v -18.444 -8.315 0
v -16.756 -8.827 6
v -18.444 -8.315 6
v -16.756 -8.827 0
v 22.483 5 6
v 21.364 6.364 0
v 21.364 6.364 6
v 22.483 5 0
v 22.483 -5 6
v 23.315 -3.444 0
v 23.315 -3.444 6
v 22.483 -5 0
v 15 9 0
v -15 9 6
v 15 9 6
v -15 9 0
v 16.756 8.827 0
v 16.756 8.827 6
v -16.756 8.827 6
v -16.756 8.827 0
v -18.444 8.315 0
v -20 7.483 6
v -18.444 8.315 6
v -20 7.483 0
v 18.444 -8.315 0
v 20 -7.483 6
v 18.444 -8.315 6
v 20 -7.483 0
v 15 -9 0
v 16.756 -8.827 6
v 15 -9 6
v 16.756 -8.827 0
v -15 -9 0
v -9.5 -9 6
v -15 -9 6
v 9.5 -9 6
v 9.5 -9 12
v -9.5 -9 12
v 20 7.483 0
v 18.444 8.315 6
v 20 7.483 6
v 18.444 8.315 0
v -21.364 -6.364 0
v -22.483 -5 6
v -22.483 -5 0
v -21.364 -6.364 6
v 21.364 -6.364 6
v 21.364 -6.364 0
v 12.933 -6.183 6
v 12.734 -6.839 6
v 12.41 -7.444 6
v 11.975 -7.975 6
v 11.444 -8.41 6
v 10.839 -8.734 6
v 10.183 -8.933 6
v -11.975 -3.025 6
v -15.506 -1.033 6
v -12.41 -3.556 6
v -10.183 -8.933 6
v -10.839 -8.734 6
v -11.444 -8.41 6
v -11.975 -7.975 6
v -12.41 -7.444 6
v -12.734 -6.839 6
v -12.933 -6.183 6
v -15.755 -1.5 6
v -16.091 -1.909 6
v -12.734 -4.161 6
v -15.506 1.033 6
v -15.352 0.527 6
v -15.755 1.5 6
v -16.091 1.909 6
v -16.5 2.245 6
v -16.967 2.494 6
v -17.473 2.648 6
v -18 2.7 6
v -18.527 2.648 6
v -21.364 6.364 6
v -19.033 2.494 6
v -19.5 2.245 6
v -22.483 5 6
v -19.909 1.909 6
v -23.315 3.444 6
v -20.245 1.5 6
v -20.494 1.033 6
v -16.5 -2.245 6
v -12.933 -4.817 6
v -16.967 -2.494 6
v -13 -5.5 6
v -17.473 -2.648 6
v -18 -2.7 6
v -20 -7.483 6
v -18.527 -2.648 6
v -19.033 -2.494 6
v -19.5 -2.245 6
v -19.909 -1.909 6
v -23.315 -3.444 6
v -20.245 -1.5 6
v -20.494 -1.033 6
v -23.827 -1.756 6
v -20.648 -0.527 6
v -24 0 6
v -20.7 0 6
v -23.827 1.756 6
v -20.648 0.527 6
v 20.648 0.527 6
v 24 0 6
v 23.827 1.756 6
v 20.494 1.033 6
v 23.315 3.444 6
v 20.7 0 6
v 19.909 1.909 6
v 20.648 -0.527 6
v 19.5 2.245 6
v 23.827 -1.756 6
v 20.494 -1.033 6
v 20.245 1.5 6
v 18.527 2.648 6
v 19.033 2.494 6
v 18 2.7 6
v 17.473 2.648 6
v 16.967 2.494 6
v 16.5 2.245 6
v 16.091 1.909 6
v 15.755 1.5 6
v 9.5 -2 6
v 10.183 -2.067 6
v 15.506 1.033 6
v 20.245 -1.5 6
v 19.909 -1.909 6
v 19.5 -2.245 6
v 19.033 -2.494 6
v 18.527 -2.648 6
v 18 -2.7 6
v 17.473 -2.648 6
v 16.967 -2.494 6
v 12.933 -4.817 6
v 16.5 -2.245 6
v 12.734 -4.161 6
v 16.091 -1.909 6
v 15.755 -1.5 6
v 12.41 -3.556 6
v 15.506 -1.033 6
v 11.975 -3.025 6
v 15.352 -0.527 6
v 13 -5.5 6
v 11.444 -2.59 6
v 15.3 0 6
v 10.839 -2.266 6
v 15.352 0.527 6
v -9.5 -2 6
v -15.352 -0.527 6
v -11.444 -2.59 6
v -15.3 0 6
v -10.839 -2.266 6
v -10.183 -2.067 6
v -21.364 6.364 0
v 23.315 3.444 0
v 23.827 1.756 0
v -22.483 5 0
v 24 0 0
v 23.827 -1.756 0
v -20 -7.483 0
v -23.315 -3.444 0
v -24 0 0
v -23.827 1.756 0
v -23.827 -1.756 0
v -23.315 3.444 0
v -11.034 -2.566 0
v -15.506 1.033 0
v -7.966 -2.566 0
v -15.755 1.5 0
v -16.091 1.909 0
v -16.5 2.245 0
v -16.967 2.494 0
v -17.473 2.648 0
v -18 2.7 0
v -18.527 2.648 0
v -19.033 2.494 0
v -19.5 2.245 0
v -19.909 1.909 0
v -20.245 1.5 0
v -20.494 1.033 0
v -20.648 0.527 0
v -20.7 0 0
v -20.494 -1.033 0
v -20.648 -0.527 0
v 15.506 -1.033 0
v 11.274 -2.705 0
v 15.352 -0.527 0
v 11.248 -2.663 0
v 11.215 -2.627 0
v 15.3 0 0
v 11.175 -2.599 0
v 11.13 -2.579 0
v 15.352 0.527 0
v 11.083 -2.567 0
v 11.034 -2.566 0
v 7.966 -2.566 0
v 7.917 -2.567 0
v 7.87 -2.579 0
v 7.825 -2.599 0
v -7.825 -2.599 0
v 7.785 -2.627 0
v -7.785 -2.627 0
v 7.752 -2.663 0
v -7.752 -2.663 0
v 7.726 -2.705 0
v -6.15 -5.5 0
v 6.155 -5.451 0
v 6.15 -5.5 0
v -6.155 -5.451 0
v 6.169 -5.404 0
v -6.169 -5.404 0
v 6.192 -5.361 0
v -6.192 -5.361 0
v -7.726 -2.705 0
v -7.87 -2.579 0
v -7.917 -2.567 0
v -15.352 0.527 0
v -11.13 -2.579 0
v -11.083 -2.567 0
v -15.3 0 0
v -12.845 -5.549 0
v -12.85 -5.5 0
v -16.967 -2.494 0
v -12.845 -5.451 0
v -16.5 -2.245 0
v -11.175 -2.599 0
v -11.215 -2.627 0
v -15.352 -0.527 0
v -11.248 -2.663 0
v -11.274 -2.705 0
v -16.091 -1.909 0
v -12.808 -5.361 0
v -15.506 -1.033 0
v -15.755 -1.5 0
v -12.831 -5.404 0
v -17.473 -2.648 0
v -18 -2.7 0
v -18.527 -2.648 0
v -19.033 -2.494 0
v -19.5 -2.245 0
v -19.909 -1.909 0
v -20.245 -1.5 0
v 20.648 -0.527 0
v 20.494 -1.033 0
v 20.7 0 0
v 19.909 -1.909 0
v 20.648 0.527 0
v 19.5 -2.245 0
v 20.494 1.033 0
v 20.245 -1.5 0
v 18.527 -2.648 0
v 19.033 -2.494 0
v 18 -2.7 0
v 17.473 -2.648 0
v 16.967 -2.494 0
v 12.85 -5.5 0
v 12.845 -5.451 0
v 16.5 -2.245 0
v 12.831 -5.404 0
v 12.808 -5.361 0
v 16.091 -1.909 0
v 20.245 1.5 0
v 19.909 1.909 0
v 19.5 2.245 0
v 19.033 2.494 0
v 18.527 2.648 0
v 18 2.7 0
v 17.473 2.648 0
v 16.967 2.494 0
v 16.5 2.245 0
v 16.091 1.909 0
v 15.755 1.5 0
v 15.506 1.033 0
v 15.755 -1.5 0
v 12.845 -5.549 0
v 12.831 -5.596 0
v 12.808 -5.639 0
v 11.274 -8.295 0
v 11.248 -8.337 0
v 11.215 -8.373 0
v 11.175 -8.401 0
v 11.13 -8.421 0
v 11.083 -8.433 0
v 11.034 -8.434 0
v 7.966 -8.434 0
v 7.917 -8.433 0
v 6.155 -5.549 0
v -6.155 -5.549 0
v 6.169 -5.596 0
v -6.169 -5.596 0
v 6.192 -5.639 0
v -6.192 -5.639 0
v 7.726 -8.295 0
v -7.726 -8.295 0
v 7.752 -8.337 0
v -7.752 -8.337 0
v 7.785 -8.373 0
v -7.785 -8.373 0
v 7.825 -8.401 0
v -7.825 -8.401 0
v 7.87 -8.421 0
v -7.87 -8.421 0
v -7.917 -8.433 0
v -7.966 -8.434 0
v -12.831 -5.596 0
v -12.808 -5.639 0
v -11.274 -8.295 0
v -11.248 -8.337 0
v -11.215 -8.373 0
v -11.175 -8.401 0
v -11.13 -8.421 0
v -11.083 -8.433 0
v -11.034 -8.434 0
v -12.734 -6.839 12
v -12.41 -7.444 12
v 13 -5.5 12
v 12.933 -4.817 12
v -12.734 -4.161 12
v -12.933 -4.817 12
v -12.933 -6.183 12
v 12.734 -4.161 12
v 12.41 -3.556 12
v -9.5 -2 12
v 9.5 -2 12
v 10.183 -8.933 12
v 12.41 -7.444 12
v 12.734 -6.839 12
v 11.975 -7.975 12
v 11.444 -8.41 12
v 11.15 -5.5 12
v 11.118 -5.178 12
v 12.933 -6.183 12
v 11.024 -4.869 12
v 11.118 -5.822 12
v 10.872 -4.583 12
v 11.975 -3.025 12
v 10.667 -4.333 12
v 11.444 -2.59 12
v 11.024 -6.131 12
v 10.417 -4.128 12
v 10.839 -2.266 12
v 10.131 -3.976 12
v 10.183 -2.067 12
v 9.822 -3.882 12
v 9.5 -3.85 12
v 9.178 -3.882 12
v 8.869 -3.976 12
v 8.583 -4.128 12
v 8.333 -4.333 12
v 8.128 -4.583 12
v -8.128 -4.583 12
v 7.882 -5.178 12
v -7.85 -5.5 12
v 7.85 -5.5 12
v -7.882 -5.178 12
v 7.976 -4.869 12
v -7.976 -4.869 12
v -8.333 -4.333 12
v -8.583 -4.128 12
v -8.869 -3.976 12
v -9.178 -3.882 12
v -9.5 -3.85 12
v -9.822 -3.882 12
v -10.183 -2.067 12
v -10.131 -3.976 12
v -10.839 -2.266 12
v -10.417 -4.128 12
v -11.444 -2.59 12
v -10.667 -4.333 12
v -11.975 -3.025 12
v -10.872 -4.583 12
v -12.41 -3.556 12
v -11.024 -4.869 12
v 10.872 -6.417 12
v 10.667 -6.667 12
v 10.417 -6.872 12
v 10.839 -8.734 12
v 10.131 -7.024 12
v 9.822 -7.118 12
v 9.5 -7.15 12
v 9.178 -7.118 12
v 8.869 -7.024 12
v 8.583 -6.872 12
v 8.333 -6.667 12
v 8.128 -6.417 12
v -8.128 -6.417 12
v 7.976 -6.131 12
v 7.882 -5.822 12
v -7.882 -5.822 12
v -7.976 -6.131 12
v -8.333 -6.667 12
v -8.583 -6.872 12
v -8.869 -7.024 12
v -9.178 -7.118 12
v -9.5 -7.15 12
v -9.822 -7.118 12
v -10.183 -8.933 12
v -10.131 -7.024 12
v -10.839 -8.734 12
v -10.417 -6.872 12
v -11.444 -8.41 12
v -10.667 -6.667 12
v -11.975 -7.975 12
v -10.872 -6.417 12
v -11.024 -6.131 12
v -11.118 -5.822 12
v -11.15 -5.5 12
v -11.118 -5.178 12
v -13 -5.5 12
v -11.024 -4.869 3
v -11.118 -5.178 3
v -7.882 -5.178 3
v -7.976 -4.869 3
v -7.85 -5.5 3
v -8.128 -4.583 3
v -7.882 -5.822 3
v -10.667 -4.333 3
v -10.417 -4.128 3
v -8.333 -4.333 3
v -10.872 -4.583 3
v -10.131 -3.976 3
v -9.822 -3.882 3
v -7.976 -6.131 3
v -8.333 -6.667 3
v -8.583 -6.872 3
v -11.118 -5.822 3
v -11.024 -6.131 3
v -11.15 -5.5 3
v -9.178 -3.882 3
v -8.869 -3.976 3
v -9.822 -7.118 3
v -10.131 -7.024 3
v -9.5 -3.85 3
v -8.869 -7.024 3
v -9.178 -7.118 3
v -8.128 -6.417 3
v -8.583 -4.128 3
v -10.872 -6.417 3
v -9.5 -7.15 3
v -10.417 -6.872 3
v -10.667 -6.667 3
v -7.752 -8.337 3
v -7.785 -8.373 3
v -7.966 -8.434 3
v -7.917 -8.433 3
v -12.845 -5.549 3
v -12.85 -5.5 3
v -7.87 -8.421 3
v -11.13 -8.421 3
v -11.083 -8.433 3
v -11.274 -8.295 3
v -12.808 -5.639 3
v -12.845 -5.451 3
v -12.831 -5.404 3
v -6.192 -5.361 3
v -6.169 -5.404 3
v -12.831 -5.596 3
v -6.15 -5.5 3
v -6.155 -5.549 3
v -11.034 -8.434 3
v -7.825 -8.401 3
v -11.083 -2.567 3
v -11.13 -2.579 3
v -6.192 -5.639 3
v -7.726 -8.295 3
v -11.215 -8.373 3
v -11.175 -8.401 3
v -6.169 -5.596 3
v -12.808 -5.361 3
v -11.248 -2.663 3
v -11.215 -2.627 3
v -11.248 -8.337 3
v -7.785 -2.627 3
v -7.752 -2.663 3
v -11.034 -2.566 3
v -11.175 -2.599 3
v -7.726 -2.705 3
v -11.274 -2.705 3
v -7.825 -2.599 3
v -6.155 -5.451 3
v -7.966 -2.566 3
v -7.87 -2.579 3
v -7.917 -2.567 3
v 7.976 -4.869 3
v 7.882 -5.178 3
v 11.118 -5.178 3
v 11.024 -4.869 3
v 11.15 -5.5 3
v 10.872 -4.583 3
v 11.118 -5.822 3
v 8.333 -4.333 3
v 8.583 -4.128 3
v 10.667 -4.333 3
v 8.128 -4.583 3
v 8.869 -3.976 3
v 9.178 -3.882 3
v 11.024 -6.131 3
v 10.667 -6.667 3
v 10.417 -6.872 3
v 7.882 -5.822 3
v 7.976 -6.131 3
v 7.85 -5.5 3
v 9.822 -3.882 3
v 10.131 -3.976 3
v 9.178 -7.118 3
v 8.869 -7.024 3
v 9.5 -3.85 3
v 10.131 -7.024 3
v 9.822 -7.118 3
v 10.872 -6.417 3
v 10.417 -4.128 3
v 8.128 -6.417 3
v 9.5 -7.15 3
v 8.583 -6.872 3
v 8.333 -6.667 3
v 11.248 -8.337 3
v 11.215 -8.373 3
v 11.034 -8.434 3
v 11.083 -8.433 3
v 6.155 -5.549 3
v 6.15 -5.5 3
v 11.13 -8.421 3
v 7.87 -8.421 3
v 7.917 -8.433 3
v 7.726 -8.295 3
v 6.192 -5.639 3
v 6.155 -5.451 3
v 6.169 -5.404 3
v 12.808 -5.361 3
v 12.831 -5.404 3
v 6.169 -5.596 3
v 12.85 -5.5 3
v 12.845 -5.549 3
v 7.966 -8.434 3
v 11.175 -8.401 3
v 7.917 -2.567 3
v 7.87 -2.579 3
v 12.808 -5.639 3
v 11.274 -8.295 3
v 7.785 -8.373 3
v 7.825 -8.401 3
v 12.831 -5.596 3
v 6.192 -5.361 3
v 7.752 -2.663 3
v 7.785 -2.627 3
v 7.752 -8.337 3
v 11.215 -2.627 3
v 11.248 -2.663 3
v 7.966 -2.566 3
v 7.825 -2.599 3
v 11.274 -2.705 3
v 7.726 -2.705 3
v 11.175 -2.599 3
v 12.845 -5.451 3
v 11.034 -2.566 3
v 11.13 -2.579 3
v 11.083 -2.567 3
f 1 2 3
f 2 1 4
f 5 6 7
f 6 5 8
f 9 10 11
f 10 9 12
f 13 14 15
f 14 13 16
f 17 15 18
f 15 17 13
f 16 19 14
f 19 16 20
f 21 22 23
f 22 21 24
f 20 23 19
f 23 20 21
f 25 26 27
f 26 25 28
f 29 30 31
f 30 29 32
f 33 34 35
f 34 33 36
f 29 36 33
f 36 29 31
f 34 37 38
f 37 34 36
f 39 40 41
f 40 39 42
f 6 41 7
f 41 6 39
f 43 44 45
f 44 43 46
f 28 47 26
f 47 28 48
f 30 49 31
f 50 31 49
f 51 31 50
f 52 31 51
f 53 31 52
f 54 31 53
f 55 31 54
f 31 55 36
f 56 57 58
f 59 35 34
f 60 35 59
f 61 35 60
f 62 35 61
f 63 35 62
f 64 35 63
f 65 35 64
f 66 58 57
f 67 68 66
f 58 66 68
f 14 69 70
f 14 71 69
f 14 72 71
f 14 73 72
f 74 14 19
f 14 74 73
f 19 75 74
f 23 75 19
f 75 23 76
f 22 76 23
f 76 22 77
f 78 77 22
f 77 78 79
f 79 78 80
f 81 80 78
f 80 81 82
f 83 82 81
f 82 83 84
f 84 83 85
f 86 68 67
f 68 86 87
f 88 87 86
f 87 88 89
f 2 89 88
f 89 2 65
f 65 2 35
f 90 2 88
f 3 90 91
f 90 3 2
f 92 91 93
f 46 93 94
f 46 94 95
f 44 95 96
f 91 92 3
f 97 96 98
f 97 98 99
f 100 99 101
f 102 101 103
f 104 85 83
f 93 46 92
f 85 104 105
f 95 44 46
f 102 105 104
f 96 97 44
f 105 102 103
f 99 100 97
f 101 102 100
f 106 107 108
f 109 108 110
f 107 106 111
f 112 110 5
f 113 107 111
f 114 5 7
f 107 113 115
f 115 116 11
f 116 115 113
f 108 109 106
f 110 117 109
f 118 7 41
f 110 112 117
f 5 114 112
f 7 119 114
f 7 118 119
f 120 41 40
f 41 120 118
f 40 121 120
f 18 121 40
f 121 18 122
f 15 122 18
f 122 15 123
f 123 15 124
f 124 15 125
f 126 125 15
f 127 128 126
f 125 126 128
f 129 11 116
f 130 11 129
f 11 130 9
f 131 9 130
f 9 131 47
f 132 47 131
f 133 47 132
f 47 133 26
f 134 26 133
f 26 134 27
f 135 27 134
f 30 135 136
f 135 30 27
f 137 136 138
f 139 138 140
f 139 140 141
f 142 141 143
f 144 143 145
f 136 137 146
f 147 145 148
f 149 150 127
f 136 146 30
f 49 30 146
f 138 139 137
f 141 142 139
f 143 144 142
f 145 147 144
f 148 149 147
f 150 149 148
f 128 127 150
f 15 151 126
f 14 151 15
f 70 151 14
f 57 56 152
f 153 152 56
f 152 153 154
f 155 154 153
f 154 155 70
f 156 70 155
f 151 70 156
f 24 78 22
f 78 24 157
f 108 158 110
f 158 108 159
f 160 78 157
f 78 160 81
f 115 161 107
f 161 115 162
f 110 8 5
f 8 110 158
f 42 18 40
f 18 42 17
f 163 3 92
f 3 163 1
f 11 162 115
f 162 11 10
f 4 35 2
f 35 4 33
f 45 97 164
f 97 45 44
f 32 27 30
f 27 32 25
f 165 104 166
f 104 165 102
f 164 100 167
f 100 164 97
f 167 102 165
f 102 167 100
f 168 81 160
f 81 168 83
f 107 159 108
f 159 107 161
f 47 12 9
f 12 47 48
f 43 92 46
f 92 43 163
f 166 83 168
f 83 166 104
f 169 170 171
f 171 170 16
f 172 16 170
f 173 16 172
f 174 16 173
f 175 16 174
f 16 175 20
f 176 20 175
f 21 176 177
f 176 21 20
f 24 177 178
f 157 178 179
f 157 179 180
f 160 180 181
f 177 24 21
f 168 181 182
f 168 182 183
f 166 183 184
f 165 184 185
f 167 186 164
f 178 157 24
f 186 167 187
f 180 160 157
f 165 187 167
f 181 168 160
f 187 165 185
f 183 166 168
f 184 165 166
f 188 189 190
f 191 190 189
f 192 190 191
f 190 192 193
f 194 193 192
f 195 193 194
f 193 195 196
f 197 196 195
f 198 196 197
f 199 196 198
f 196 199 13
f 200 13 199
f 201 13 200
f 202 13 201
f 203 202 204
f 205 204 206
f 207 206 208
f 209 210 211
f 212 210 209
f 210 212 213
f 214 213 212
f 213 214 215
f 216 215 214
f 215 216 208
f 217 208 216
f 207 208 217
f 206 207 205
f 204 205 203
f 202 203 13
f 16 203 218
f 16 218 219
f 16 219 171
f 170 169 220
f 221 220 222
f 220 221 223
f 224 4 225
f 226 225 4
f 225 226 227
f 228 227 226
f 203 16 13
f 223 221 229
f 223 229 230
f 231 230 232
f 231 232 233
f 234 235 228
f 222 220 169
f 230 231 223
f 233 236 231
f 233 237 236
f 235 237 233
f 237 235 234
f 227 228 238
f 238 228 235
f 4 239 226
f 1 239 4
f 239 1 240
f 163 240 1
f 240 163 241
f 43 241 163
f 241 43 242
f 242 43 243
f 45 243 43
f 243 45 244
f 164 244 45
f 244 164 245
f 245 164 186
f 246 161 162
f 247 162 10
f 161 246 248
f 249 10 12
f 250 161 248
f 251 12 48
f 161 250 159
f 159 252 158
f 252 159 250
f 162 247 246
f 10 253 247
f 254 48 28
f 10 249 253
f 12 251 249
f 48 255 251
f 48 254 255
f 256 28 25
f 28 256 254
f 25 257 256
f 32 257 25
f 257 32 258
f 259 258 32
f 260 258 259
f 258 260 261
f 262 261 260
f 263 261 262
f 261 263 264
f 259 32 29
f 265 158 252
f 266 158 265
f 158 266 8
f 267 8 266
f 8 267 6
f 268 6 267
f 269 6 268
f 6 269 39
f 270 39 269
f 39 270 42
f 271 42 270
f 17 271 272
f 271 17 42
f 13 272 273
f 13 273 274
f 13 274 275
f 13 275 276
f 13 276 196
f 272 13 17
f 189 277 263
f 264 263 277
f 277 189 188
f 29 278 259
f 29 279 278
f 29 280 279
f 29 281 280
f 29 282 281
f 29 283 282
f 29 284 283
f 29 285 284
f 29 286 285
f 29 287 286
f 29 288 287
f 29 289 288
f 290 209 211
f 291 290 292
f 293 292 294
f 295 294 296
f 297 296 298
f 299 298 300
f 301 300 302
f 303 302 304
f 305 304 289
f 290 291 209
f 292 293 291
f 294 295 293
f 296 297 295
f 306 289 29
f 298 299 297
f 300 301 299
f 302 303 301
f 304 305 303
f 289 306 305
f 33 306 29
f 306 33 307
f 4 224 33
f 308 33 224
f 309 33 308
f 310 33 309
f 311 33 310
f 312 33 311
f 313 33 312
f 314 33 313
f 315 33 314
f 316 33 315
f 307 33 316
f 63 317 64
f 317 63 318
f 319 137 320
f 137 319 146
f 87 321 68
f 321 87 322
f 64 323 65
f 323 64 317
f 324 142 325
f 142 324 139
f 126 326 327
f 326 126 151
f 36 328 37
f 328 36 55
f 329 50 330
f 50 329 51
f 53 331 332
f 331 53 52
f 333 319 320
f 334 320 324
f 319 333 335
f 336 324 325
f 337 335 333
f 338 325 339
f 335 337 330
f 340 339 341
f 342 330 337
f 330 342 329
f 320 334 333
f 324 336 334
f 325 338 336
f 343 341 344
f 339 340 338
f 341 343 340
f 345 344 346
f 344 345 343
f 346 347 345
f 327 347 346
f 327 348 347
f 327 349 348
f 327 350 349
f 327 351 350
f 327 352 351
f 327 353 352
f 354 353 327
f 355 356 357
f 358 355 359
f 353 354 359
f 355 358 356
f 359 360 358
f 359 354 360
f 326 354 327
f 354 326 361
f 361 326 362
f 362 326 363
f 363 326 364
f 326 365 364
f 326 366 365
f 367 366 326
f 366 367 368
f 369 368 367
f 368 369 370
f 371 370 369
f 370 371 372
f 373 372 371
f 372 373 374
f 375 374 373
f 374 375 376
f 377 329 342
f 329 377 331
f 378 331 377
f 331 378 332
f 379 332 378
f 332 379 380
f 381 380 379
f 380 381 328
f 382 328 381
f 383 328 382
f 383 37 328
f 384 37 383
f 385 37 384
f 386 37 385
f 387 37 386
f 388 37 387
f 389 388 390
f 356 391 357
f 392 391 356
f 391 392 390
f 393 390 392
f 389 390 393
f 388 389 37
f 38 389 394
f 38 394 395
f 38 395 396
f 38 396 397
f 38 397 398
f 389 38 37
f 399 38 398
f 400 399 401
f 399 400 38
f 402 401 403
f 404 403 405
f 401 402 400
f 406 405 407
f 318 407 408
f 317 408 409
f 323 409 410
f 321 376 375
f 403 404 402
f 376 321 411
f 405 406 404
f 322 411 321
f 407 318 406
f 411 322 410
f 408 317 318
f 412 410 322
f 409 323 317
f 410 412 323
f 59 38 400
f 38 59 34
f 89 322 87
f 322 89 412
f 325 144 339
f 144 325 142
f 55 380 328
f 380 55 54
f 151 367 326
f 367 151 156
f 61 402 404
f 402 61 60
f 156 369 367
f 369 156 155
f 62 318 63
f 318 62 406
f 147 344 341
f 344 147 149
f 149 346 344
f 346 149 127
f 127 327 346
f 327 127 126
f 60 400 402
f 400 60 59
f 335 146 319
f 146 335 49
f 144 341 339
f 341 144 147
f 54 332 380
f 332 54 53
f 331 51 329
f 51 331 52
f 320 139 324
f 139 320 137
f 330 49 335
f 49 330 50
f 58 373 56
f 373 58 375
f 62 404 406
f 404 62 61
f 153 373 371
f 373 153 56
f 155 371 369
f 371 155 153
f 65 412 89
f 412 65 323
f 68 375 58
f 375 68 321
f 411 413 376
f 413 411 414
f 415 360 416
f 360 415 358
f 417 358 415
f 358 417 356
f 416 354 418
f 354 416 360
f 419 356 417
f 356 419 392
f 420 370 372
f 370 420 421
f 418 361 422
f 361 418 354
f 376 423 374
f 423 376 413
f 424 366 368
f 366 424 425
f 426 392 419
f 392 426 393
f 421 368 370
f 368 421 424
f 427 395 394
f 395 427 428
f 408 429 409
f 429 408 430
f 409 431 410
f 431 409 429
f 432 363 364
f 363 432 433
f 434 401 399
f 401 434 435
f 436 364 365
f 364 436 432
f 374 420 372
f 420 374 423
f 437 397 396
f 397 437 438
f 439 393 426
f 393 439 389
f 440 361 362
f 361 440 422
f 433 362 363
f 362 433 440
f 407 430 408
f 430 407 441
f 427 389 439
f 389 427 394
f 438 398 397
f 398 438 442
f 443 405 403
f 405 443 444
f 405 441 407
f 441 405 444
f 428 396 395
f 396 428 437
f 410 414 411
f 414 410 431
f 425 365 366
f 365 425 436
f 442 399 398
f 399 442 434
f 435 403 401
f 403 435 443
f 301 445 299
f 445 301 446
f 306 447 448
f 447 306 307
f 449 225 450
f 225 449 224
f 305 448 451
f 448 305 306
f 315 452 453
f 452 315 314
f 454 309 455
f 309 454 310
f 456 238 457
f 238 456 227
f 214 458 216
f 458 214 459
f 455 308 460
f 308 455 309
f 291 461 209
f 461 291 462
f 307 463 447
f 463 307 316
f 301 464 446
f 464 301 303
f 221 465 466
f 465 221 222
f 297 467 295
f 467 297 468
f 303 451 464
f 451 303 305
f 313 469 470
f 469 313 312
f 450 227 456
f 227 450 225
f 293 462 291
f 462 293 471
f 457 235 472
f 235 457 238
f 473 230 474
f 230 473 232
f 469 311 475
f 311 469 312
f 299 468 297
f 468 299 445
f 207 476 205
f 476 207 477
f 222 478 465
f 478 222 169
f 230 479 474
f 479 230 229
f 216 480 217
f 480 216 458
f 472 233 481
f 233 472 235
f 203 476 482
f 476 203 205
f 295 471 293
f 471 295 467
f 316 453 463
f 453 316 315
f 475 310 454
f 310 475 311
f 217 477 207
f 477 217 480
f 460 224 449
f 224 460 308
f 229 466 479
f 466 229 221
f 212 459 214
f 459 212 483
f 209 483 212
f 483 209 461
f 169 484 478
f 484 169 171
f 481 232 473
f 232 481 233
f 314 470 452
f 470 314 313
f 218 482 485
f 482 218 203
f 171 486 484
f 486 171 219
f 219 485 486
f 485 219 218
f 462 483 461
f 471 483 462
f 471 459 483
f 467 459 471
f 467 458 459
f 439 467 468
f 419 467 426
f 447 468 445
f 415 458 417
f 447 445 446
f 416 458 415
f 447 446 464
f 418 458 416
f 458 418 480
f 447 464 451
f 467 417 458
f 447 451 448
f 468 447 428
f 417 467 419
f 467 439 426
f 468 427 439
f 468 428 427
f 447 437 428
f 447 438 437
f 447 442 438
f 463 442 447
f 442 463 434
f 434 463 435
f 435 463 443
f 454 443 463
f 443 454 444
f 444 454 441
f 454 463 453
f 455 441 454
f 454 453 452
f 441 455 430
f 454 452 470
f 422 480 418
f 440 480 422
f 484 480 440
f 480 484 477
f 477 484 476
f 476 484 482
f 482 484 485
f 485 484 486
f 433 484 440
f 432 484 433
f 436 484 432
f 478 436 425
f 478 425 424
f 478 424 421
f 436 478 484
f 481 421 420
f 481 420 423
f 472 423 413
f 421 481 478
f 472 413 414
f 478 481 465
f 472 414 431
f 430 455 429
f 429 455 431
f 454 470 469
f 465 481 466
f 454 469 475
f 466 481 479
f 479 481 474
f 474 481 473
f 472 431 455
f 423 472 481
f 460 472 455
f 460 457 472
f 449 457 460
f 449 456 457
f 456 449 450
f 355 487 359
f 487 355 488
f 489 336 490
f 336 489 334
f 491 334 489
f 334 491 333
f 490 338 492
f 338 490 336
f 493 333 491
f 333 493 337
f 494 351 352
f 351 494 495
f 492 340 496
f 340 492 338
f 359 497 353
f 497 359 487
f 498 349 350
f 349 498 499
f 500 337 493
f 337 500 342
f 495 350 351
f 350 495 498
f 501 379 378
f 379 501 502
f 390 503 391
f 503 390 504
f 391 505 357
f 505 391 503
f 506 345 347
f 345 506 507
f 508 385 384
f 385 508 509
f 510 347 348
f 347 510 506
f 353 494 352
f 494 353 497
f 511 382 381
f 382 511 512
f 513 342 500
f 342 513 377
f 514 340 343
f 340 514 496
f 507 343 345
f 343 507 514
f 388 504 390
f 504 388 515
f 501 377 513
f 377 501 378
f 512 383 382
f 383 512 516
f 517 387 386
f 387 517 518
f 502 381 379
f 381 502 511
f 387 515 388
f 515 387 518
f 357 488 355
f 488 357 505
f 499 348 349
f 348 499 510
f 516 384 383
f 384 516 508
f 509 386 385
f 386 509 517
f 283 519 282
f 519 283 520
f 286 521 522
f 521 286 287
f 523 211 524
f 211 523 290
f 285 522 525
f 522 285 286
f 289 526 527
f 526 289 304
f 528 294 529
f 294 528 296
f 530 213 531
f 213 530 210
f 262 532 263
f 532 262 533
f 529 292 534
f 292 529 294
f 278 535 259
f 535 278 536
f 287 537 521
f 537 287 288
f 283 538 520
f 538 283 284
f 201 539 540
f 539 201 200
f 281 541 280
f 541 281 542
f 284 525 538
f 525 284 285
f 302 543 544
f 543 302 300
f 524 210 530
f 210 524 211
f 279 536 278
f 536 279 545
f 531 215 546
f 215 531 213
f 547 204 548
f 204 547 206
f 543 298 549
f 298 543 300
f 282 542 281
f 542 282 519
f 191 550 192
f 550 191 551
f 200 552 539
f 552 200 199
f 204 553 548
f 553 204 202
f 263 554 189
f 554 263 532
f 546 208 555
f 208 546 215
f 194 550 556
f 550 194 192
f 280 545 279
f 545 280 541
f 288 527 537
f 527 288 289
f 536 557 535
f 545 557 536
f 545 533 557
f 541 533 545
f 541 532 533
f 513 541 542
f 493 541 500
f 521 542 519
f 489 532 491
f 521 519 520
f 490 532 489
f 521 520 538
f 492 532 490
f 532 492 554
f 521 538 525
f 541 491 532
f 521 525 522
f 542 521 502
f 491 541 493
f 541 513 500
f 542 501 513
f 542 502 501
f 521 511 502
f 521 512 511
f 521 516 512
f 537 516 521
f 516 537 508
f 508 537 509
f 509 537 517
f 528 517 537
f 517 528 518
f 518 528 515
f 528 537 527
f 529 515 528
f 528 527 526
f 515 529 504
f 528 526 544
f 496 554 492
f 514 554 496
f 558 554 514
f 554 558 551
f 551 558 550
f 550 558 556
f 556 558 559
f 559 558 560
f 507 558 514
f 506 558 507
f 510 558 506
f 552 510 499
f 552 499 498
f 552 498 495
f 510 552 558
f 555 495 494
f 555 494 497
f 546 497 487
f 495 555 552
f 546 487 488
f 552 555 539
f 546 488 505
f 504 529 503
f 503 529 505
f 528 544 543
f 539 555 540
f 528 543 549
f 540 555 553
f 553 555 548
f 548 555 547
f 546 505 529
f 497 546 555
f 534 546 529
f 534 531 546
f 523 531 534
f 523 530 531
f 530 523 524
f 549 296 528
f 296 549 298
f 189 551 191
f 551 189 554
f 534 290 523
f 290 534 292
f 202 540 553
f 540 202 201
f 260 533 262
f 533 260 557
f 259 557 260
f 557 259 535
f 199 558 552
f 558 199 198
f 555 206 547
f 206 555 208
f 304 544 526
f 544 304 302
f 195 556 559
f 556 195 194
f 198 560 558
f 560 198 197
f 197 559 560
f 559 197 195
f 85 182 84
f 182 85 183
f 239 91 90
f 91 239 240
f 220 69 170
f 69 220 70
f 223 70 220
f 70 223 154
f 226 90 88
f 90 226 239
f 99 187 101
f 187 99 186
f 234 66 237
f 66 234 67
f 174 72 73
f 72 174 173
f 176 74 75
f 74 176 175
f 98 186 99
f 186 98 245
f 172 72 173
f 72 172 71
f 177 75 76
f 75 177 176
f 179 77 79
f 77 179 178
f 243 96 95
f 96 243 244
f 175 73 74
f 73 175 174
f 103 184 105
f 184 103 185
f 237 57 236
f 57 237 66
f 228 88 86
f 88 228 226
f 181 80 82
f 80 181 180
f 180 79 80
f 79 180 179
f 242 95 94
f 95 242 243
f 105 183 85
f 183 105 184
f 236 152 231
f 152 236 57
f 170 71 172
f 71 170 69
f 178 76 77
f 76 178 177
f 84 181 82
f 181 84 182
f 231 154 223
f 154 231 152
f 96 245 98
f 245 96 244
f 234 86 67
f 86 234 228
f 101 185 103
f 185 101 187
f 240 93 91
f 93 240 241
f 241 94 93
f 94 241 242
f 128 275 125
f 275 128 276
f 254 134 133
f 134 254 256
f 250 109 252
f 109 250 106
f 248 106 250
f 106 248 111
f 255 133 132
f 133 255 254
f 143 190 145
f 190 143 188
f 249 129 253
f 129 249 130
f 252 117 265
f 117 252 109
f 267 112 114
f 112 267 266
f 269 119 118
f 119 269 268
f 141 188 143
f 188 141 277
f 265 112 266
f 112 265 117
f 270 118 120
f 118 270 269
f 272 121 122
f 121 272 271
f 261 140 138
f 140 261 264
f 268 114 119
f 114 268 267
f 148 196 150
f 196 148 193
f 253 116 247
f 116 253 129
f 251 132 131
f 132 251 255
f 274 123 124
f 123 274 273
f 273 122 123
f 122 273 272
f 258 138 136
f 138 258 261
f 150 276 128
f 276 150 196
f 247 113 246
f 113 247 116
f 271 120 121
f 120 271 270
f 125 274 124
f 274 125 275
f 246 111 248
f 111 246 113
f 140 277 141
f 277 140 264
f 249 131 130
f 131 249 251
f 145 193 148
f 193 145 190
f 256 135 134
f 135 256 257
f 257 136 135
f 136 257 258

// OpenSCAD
$fn=32;

module nut3(h=50) {
    hull() {
        translate([3.1,0,0]) cylinder(d=0.5,h=4);
        rotate([0,0,60]) translate([3.1,0,0]) cylinder(d=0.5,h=4);
        rotate([0,0,120]) translate([3.1,0,0]) cylinder(d=0.5,h=4);
        rotate([0,0,180]) translate([3.1,0,0]) cylinder(d=0.5,h=4);
        rotate([0,0,240]) translate([3.1,0,0]) cylinder(d=0.5,h=4);
        rotate([0,0,300]) translate([3.1,0,0]) cylinder(d=0.5,h=4);
    }
}

module endstop() {
    difference() {
        union() {
            hull() {
                translate([-15,0,0]) cylinder(d=18,h=6);
                translate([15,0,0]) cylinder(d=18,h=6);
            }
            hull() {
                translate([-9.5,-5.5,0]) cylinder(d=7,h=12);
                translate([9.5,-5.5,0]) cylinder(d=7,h=12);
            }
        }
        
        translate([-9.5,-5.5,-1]) cylinder(d=3.3,h=14);
        translate([-9.5,-5.5,-1]) nut3();
        translate([9.5,-5.5,-1]) cylinder(d=3.3,h=14);
        translate([9.5,-5.5,-1]) nut3();
        
        translate([-18,0,-1]) cylinder(d=5.4,h=8);
        translate([18,0,-1]) cylinder(d=5.4,h=8);
    }
}

endstop();
